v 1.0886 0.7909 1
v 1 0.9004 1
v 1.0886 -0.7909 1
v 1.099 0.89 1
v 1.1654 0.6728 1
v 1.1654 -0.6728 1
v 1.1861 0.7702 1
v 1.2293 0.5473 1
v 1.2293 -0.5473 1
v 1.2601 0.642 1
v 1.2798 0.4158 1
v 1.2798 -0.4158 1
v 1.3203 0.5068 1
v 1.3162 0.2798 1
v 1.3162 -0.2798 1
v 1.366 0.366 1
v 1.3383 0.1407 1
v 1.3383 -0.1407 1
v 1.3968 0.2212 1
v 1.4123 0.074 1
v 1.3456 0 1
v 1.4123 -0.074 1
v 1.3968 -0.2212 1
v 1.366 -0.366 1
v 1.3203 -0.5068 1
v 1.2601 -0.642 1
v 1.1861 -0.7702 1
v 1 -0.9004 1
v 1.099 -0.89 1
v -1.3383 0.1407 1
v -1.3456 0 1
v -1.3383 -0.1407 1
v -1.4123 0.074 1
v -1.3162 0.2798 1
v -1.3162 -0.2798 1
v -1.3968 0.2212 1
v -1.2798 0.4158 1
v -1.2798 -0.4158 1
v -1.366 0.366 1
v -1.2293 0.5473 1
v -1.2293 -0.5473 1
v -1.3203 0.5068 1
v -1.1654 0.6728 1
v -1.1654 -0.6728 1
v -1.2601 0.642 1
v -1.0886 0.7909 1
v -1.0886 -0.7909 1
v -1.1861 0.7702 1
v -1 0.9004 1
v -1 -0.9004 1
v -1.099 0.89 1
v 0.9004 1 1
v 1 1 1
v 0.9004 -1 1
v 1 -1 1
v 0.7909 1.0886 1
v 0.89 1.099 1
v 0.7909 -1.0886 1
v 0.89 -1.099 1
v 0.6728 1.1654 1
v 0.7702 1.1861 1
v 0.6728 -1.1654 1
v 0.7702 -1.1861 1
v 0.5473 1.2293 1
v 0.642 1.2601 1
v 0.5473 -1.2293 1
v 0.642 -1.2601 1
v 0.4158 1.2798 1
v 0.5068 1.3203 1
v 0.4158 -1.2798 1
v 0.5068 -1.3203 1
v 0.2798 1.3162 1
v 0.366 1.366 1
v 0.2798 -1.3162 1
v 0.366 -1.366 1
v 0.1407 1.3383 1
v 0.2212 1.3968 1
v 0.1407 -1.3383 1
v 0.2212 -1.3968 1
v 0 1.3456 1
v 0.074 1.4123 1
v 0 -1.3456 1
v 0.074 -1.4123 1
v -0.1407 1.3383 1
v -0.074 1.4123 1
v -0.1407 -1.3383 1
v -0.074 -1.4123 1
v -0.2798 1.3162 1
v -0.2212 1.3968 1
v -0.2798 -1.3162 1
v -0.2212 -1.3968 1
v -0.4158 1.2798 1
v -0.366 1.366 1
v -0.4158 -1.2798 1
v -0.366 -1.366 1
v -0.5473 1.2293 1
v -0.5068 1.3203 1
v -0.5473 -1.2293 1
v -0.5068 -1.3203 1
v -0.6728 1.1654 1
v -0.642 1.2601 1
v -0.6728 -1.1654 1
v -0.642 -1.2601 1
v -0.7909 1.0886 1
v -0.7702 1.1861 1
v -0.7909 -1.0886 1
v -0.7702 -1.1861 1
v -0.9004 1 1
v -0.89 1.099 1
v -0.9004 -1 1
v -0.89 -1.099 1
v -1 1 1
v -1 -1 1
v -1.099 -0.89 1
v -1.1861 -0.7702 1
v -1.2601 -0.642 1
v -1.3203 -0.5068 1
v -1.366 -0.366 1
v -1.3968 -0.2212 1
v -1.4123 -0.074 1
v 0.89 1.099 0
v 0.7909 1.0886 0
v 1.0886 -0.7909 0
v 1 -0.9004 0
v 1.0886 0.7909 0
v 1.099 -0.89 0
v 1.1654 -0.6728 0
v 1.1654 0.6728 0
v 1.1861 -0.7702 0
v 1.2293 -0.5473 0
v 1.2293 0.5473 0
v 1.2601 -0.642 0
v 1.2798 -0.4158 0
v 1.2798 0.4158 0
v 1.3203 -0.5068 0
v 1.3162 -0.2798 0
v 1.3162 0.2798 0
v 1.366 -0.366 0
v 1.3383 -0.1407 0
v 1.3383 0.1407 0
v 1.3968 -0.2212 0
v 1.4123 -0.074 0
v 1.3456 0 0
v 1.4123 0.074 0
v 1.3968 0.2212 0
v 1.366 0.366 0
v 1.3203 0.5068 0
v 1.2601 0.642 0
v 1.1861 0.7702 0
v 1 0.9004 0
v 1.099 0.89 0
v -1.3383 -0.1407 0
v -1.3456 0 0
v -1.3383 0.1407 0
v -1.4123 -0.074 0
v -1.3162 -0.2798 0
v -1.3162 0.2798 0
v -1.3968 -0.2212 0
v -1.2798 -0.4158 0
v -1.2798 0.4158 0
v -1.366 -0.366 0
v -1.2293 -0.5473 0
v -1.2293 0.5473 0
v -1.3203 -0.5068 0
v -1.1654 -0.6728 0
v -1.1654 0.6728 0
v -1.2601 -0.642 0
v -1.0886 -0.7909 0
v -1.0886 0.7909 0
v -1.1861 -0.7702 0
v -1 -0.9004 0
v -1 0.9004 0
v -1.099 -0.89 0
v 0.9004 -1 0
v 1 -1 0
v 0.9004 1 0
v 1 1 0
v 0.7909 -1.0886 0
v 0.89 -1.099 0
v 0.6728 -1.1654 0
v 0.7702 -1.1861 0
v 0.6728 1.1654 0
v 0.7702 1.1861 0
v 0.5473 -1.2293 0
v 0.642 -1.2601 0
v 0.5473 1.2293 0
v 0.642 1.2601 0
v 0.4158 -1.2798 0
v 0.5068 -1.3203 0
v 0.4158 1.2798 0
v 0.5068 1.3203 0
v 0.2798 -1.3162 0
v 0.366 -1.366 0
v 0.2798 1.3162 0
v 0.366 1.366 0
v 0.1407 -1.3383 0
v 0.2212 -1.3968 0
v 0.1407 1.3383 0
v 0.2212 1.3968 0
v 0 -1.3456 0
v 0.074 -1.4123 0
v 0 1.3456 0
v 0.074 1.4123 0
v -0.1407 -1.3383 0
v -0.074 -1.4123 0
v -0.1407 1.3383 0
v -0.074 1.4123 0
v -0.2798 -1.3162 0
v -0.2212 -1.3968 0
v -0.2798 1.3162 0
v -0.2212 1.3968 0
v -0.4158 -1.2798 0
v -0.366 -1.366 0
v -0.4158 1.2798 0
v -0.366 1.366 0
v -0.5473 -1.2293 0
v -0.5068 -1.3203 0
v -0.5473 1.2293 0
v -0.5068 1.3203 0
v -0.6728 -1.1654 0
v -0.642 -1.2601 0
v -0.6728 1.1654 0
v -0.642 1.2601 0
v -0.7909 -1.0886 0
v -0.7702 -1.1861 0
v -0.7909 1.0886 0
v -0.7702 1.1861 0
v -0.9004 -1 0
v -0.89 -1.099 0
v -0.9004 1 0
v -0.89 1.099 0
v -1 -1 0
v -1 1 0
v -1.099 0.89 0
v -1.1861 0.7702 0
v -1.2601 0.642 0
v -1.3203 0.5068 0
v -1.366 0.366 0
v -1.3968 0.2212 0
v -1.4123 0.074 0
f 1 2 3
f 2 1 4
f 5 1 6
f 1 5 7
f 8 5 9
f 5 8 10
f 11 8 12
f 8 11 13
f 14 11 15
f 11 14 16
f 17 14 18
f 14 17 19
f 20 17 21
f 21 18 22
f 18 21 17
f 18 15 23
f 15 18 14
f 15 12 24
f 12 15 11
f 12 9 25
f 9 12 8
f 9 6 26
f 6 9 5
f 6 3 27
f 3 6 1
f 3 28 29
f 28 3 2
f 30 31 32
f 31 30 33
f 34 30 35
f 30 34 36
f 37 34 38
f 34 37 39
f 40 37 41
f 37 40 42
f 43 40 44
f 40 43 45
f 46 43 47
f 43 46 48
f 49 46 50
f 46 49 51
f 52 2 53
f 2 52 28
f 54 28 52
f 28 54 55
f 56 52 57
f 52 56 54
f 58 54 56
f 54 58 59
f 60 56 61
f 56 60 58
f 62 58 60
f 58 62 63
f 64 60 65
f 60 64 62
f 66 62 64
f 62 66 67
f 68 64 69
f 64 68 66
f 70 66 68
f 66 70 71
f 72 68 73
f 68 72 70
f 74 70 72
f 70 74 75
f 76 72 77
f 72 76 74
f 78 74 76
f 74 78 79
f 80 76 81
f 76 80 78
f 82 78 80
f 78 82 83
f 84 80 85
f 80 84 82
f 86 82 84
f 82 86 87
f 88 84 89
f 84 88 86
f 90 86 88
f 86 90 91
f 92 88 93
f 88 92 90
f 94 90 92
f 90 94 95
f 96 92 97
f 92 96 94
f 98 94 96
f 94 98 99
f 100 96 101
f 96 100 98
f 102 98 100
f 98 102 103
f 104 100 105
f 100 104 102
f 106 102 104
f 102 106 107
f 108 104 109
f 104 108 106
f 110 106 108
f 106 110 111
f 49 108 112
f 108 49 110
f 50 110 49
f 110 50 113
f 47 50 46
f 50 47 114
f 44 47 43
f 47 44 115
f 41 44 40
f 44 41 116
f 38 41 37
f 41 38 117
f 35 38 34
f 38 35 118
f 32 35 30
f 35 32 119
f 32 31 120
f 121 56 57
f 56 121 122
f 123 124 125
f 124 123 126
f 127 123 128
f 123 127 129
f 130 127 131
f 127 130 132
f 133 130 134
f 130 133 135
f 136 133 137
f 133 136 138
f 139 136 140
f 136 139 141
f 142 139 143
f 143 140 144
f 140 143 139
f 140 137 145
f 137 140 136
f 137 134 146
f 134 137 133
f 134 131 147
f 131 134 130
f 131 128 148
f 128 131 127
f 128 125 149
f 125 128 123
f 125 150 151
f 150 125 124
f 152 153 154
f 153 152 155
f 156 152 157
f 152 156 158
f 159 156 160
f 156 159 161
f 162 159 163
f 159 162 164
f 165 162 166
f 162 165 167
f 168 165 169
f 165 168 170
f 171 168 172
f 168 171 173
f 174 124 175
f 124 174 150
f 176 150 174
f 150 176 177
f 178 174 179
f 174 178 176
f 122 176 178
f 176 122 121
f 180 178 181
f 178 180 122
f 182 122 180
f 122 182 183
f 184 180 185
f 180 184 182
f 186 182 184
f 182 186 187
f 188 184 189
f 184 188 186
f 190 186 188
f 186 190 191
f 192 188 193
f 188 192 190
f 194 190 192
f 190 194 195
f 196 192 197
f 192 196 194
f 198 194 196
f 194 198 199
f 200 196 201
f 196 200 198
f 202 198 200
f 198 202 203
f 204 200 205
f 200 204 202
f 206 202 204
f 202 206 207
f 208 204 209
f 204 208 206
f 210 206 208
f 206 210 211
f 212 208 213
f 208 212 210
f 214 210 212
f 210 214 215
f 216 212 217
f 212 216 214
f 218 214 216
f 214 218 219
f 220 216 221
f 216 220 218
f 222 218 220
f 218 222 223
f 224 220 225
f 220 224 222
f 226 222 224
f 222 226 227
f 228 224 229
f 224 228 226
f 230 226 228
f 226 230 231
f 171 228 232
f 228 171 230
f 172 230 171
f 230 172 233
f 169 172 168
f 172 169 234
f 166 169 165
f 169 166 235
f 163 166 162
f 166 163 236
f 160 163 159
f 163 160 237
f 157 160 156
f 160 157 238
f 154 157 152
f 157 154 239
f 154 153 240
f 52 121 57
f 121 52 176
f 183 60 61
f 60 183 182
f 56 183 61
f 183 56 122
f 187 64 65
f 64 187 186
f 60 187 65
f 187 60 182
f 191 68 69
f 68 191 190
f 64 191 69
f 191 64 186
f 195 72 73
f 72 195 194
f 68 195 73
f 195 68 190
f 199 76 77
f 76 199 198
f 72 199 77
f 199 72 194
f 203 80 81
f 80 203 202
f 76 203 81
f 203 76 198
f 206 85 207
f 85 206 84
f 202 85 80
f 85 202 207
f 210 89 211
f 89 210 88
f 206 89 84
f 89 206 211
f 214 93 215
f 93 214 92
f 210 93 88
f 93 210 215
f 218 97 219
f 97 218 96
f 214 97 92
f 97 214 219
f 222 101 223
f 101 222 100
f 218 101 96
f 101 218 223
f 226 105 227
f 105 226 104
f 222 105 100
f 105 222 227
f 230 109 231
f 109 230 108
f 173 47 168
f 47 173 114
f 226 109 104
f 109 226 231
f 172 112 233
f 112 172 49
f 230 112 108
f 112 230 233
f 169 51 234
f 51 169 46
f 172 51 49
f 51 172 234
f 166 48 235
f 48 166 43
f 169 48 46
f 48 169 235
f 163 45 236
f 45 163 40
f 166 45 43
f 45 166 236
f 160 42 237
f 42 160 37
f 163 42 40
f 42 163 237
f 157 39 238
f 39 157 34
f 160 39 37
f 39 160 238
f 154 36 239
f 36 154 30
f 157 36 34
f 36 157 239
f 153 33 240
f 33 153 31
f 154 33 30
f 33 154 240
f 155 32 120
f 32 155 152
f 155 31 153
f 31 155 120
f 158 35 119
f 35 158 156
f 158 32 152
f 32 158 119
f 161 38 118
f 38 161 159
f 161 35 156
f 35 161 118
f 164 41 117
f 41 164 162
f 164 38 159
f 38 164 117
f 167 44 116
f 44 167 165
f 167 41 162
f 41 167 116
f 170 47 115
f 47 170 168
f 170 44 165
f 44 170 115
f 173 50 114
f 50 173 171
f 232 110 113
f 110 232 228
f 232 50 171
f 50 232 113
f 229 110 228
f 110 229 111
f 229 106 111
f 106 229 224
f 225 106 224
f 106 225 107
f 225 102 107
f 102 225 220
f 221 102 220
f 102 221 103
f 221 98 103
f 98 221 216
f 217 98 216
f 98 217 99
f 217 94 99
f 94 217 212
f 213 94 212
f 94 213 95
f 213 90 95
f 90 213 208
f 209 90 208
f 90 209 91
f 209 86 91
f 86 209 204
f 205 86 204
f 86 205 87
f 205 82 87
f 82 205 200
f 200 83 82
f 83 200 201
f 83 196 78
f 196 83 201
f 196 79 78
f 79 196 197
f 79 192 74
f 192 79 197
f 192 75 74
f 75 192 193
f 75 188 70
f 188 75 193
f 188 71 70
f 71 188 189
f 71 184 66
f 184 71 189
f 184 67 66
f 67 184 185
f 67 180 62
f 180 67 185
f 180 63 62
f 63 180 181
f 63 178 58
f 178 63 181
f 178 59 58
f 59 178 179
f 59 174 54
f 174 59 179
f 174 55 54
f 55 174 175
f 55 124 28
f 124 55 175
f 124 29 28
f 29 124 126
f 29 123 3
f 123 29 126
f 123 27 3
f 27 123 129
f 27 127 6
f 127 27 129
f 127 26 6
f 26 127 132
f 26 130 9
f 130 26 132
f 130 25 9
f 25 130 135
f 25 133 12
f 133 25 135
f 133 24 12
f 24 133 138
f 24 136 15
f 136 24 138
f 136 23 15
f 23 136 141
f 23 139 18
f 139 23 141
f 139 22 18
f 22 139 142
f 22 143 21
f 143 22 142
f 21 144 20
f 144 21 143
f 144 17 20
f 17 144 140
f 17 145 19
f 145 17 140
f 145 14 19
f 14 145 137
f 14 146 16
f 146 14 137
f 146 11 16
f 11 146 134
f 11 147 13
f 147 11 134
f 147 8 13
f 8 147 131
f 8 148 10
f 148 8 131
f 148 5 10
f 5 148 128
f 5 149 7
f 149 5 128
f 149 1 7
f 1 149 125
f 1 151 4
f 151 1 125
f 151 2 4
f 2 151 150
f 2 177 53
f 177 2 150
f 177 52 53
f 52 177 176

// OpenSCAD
$fn = 50;

shaft_r = 80;
shaft_h = 100;

gear_r = shaft_r * 1.5;
gear_h = shaft_h * 0.5;

hole_r = 25;

module shaft() {
    cylinder(r = shaft_r, h = shaft_h);
}

module gear_base() {
    cylinder(r = gear_r, h = gear_h);
}

module center_hole() {
    translate([0, 0, -1]) {
        cylinder(r = hole_r, h = shaft_h + 2);
    }
}

module tooth(x) {
    scale([2.5, 1, 1]) {
        rotate([0, 0, 45]) {
            translate([0, 0, gear_h/2]) {
                cube([10, 10, gear_h + 2], center = true);
            }
        }
    }
}


n_teeth = 60;
union() {
    // union() {
    //     shaft();
    //     gear_base();
    // }
    // center_hole();
    for(i = [1:n_teeth]) {
        rotate([0, 0, i * 360 / n_teeth]) {
            // translate([gear_r + 5, 0, 0]) {
                cube();
            // }
        }
    }
}
